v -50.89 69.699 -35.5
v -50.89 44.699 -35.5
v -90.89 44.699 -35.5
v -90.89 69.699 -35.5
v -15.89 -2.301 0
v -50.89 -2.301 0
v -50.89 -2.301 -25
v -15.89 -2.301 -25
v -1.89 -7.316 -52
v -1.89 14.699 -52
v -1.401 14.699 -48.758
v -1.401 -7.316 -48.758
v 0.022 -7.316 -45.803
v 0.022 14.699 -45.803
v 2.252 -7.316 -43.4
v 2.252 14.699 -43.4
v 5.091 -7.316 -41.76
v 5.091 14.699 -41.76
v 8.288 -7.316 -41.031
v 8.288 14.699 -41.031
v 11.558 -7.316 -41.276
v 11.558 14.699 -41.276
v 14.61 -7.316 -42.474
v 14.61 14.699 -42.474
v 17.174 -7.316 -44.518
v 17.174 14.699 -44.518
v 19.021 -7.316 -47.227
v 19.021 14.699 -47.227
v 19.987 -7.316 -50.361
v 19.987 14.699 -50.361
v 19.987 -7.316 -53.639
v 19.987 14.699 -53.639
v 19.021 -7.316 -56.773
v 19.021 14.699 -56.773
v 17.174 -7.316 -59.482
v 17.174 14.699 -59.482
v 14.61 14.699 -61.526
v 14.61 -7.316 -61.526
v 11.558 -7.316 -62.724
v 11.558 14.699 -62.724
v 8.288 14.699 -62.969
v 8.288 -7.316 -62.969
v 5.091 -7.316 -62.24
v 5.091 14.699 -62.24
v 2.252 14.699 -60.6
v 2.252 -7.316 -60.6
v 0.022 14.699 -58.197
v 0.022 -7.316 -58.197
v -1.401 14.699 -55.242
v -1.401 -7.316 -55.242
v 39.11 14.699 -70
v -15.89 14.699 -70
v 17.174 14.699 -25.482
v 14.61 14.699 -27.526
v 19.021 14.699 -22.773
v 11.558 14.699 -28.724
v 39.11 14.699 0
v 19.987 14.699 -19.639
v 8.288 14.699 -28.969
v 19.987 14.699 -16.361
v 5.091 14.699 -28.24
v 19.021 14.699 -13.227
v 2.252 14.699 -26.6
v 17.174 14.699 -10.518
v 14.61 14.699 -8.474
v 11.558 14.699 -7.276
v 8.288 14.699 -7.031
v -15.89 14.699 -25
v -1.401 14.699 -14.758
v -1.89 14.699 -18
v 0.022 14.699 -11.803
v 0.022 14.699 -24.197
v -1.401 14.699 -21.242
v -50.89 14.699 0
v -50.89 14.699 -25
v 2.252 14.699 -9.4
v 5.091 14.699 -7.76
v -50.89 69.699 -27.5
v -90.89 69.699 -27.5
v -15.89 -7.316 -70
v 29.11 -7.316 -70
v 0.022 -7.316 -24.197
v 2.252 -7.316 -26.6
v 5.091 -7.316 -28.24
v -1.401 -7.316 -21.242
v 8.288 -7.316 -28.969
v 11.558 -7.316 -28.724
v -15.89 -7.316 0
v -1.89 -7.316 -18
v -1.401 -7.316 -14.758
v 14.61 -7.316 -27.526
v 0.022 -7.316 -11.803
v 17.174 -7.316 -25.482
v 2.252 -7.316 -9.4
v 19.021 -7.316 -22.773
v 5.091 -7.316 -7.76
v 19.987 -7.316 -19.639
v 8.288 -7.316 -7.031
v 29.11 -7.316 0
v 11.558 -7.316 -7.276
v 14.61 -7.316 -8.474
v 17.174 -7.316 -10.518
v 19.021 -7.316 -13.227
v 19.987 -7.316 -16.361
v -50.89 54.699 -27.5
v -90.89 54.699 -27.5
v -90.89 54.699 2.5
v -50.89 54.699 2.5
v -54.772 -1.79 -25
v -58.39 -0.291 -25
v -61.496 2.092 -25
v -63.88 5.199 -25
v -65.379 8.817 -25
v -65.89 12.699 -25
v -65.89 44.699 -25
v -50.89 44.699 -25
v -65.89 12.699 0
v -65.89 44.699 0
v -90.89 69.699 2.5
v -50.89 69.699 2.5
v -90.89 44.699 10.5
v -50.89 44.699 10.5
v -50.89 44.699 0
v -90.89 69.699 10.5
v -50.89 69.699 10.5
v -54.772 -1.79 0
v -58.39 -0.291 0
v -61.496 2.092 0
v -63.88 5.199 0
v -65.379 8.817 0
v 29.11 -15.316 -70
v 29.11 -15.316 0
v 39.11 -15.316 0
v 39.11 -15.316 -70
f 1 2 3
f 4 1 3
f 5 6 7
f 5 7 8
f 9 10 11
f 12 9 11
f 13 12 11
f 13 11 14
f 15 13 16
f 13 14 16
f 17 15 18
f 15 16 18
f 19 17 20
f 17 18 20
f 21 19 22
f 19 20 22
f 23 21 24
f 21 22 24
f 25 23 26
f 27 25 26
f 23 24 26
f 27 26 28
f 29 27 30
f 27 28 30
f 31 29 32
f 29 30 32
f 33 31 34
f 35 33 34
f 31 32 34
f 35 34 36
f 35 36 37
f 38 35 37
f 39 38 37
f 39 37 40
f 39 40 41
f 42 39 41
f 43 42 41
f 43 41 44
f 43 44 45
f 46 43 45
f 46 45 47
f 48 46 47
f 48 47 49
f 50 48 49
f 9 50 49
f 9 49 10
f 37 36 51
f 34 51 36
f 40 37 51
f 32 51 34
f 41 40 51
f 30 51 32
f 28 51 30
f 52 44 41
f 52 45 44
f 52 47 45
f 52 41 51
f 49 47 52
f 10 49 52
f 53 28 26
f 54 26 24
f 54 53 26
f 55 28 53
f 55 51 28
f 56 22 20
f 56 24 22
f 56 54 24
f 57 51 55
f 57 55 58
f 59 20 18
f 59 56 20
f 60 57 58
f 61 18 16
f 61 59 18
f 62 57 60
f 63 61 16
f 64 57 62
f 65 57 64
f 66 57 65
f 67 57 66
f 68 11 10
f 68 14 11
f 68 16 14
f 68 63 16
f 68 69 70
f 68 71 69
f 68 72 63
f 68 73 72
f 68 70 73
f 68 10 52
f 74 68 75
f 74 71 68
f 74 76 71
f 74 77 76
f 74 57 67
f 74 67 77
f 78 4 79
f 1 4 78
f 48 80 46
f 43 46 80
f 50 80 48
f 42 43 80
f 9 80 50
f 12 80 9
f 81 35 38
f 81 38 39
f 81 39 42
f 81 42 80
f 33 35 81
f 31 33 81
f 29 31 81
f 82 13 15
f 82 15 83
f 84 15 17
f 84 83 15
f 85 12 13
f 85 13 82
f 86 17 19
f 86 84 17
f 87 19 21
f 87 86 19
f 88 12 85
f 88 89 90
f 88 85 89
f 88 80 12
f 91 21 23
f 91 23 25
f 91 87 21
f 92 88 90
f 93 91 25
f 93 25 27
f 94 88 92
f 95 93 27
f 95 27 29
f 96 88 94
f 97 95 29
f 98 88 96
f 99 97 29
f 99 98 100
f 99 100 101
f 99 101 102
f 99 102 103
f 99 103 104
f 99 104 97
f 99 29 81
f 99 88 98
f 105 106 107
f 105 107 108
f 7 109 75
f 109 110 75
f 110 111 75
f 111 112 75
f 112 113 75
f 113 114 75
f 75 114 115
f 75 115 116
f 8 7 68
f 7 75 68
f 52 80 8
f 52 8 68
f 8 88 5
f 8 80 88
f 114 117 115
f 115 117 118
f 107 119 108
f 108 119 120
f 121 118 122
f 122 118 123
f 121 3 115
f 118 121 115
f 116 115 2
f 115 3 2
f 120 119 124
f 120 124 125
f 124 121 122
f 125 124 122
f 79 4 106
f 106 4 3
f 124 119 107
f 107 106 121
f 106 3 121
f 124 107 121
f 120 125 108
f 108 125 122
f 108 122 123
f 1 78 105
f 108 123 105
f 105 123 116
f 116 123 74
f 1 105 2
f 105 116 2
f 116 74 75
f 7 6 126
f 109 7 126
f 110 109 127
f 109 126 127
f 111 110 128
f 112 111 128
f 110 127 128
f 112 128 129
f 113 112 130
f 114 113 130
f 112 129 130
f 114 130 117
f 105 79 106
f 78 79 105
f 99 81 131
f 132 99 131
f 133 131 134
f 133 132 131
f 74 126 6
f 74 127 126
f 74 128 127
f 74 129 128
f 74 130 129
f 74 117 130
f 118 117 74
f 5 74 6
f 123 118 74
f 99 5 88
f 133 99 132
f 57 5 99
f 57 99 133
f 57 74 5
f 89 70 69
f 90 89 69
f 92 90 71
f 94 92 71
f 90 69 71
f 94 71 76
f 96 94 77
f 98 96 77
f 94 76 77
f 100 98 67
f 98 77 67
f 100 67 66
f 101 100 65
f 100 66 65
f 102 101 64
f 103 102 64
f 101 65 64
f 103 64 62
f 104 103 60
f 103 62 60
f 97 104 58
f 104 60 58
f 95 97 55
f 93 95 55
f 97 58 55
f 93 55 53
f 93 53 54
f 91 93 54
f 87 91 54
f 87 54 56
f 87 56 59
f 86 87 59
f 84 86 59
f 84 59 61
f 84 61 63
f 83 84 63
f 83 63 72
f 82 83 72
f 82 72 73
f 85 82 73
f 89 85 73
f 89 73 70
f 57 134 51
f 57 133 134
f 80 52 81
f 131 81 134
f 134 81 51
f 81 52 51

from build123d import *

# Parameters (mm, degrees)
BOSS_EXTRUDE2_DEPTH = 25
BOSS_EXTRUDE3_DEPTH = 45
SKETCH3_W           = 15
SKETCH3_H           = 25
BOSS_EXTRUDE4_DEPTH = 25
SKETCH4_W           = 40
SKETCH4_H           = 30
CUT_EXTRUDE1_DEPTH  = 15
SKETCH5_R           = 11
CUT_EXTRUDE2_DEPTH  = 128.224012634


with BuildPart() as part:
    # Sketch1 → Boss-Extrude2 (new body)
    with BuildSketch(Plane.XY):
        Polygon((29.110234951, -15.315580854), (39.110234951, -15.315580854), (39.110234951, -2.038537921), (39.110234951, 14.698902507), (-50.889765049, 14.698902507), (-50.889765049, -2.301097493), (-15.889765049, -2.301097493), (-15.889765049, -7.315580854), (29.110234951, -7.315580854), align=None)
        with BuildLine():
            Line((-65.889765049, 12.698902507), (-65.889765049, 44.698902507))
            Line((-65.889765049, 44.698902507), (-50.889765049, 44.698902507))
            Line((-50.889765049, 44.698902507), (-50.889765049, 14.698902507))
            Line((-50.889765049, 14.698902507), (-50.889765049, -2.301097493))
            ThreePointArc((-50.889765049, -2.301097493), (-61.496366767, 2.092300789), (-65.889765049, 12.698902507))
        make_face()
    extrude(amount=-BOSS_EXTRUDE2_DEPTH)

    # Sketch2 → Boss-Extrude3 (add)
    with BuildSketch(Plane(origin=(0, 0, -25), x_dir=(-1, 0, 0), z_dir=(0, 0, -1))):
        Polygon((-39.110234951, -15.315580854), (-39.110234951, 14.698902507), (15.889765049, 14.698902507), (15.889765049, -2.301097493), (15.889765049, -7.315580854), (-29.110234951, -7.315580854), (-29.110234951, -15.315580854), align=None)
    extrude(amount=BOSS_EXTRUDE3_DEPTH)

    # Sketch3 → Boss-Extrude4 (add)
    with BuildSketch(Plane(origin=(0, 44.698902507, 0), x_dir=(1, 0, 0), z_dir=(0, 1, 0))):
        Polygon((-50.889765049, 25), (-50.889765049, 35.5), (-90.889765049, 35.5), (-90.889765049, -10.5), (-50.889765049, -10.5), (-50.889765049, 0), (-65.889765049, 0), (-65.889765049, 25), align=None)
        with Locations((-58.389765049, 12.5)):
            Rectangle(SKETCH3_W, SKETCH3_H)
    extrude(amount=BOSS_EXTRUDE4_DEPTH)

    # Sketch4 → Cut-Extrude1 (cut)
    with BuildSketch(Plane(origin=(0, 69.698902507, 0), x_dir=(1, 0, 0), z_dir=(0, 1, 0))):
        with Locations((-70.889765049, 12.5)):
            Rectangle(SKETCH4_W, SKETCH4_H)
    extrude(amount=-CUT_EXTRUDE1_DEPTH, mode=Mode.SUBTRACT)

    # Sketch5 → Cut-Extrude2 (cut, through all)
    with BuildSketch(Plane(origin=(0, 14.698902507, 0), x_dir=(1, 0, 0), z_dir=(0, 1, 0))):
        with Locations(Location((9.110234951, 18, 0), (0, 0, 180))):
            Circle(SKETCH5_R)
        with Locations(Location((9.110234951, 52, 0), (0, 0, 180))):
            Circle(SKETCH5_R)
    extrude(amount=-CUT_EXTRUDE2_DEPTH, mode=Mode.SUBTRACT)


solid = part.part
